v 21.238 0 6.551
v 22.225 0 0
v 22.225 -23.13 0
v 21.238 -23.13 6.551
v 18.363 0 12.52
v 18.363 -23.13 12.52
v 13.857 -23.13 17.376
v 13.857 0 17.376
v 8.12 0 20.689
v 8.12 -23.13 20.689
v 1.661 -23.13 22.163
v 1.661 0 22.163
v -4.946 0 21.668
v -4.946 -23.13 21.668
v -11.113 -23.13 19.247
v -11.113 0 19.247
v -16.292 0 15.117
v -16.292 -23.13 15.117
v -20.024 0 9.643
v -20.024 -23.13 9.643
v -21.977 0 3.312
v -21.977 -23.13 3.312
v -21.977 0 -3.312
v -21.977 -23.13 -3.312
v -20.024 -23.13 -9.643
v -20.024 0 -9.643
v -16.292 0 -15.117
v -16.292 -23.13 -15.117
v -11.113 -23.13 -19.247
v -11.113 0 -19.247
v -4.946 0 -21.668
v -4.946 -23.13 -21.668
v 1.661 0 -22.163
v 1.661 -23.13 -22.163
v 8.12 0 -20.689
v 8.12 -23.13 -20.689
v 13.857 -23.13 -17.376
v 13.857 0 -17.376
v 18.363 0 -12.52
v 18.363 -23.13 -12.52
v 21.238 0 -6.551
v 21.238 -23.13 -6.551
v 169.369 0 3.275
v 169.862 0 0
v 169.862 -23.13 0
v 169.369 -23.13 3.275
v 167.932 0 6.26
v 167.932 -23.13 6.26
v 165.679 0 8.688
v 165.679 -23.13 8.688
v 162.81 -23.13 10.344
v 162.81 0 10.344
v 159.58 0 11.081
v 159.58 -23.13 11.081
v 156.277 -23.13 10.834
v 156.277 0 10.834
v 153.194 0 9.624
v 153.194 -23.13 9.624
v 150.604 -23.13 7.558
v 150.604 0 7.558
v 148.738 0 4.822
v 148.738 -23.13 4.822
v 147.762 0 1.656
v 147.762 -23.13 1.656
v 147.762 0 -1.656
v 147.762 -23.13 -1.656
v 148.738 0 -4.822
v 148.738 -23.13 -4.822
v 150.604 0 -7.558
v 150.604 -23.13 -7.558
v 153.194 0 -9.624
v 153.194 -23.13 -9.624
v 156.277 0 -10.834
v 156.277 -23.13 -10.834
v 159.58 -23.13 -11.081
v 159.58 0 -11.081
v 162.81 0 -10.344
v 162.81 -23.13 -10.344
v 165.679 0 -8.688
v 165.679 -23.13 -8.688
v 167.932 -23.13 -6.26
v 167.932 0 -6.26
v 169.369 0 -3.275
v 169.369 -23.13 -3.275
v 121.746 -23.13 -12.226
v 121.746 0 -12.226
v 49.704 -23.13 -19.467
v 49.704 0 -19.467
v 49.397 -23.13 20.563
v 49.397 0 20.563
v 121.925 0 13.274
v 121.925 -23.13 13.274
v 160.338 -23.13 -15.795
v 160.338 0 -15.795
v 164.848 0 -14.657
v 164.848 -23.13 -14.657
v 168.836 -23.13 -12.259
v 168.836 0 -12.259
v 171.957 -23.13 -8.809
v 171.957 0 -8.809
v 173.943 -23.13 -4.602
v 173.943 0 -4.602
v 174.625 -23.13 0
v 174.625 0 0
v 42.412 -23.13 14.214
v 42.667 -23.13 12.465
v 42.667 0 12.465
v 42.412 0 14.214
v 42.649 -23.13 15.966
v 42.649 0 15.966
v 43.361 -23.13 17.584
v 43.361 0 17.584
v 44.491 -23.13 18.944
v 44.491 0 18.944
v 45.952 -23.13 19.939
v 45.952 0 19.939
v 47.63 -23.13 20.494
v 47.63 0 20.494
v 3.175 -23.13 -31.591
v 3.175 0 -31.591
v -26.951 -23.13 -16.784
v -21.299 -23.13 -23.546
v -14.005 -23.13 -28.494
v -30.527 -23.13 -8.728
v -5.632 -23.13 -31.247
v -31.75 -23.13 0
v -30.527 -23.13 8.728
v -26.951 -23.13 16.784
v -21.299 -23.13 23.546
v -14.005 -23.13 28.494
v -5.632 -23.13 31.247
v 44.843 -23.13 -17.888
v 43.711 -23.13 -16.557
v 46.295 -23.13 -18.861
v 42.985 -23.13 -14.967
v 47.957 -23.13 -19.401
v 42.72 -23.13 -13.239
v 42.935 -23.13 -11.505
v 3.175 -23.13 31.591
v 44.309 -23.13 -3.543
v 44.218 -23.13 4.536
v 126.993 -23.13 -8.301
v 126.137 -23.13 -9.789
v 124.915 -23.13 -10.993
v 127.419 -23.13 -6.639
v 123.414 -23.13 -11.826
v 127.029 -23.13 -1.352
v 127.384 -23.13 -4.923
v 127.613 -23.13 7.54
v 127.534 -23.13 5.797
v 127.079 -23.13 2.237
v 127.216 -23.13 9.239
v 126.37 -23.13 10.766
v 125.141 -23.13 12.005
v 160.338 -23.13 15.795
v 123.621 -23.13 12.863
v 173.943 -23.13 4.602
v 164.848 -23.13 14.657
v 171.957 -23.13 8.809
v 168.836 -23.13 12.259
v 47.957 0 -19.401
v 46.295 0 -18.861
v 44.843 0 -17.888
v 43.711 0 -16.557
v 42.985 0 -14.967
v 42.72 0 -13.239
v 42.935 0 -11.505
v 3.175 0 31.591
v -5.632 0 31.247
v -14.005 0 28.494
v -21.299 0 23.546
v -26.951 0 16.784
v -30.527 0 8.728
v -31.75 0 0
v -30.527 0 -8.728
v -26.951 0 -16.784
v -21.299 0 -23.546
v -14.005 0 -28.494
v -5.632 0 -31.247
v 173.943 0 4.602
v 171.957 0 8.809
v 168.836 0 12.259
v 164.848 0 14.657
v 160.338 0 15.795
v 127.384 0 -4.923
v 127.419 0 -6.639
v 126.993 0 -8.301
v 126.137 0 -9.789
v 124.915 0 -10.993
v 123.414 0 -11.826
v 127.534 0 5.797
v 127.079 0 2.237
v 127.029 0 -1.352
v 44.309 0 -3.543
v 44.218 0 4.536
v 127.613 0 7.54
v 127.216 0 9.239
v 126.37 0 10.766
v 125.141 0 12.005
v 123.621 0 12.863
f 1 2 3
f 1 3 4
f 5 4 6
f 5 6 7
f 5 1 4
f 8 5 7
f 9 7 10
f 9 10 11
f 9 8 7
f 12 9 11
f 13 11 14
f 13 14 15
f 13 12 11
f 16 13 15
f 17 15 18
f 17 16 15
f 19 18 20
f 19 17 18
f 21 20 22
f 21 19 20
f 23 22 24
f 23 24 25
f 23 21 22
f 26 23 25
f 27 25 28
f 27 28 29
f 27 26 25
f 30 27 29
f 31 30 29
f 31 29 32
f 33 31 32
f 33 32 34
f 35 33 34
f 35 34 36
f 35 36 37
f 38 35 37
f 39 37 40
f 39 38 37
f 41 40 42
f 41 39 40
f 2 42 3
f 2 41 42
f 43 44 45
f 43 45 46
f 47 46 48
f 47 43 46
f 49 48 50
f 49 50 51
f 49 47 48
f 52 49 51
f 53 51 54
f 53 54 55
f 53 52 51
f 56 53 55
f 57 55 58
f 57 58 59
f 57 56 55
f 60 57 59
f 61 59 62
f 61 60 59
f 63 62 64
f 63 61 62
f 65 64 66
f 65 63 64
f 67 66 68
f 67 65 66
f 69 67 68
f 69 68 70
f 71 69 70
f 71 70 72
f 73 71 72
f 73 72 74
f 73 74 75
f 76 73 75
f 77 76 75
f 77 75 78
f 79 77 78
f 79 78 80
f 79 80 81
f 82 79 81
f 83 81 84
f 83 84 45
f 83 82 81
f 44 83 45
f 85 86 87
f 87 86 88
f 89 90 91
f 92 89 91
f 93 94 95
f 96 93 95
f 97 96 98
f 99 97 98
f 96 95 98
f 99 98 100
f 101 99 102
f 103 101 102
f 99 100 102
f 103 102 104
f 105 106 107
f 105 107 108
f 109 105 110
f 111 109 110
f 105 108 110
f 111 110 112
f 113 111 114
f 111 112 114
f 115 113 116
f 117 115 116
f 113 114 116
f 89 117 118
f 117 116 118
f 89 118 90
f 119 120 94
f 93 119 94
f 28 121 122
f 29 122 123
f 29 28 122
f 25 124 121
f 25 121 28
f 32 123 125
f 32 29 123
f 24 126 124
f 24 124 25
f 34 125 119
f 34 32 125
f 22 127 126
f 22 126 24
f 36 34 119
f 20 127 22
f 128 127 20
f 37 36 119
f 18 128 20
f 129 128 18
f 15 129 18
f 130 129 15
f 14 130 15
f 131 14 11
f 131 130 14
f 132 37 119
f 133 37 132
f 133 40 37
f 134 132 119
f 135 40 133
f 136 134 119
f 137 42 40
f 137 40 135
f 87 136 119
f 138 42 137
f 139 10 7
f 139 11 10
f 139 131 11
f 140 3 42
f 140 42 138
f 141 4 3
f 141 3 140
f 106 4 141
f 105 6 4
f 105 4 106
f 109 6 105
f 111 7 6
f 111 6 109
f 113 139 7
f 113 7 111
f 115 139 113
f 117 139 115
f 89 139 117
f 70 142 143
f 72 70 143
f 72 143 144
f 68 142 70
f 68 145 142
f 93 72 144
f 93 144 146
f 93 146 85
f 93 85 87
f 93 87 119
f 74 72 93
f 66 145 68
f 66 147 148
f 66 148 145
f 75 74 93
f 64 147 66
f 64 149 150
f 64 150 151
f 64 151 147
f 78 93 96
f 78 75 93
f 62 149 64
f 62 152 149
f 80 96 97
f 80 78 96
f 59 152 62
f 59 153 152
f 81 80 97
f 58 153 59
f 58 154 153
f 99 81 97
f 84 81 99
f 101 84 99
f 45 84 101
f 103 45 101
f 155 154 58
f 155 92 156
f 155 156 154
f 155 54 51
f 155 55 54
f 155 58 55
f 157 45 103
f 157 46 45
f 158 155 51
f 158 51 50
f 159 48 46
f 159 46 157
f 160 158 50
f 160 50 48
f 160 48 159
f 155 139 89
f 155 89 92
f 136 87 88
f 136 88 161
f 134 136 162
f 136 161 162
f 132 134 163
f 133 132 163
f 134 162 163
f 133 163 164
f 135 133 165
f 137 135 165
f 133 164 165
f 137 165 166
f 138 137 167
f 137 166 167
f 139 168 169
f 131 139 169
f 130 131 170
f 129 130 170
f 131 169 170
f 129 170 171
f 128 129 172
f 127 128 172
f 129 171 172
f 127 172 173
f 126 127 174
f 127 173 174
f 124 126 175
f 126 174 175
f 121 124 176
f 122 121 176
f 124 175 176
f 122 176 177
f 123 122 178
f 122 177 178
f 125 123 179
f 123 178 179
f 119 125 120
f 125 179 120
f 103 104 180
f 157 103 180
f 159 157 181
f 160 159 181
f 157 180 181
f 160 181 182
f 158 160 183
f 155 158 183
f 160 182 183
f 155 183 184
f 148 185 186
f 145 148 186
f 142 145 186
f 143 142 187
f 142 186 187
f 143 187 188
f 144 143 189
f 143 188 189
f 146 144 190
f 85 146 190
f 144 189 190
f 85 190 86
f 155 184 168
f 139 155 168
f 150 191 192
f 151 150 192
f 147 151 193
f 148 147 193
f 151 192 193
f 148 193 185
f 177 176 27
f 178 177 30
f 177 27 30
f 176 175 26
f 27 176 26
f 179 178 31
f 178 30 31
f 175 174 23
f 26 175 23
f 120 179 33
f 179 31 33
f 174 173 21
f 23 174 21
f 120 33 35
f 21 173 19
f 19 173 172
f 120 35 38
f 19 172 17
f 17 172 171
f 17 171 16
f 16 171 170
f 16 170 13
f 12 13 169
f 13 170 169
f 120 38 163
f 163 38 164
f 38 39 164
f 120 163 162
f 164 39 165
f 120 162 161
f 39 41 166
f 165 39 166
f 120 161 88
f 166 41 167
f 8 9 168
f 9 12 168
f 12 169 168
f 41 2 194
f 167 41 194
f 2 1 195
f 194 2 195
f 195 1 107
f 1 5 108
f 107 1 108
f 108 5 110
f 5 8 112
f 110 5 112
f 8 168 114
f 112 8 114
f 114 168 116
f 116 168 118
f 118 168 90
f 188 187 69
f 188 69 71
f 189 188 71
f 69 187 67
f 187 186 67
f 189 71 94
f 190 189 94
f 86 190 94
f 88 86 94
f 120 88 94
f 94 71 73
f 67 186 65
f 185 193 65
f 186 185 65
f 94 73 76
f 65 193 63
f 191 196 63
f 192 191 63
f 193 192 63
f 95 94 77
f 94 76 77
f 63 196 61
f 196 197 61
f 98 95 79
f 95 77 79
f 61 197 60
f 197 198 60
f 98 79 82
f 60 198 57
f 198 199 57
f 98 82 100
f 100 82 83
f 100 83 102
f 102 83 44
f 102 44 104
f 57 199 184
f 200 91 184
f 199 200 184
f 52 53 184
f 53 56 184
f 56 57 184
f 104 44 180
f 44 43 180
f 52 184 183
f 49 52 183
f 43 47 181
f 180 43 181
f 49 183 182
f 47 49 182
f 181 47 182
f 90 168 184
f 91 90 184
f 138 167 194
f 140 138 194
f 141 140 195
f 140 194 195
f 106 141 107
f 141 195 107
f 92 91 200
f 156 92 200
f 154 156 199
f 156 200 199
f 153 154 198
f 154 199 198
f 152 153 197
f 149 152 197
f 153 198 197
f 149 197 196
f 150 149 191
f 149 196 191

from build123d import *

# Parameters (mm, degrees)
F0_R     = 22.225
F0_R_2   = 11.1125
F1_DEPTH = 23.1302697212


# Not quite as in the source:
# - a feature of the source that left no trace in its solid (it failed there, or was rolled back) is left out


with BuildPart() as f1:
    # F0 (on Front) → F1 (new body)
    with BuildSketch(Plane.XZ):
        with BuildLine():
            ThreePointArc((3.175, 31.5908511281), (23.5464301965, 21.2985474857), (31.75, 0))
            ThreePointArc((31.75, 0), (23.5464301965, -21.2985474857), (3.175, -31.5908511281))
            Line((3.175, -31.5908511281), (160.3375, -15.7954255641))
            ThreePointArc((160.3375, -15.7954255641), (142.875, 0), (160.3375, 15.7954255641))
            Line((160.3375, 15.7954255641), (3.175, 31.5908511281))
        make_face()
        with BuildLine():
            ThreePointArc((42.9352789855, -11.5049692931), (44.4472073469, 0.4982560178), (42.6665789099, 12.4645715579))
            ThreePointArc((42.6665789099, 12.4645715579), (43.8780302599, 18.3037033525), (49.3968044685, 20.5633948632))
            Line((49.3968044685, 20.5633948632), (121.9253365113, 13.2740031244))
            ThreePointArc((121.9253365113, 13.2740031244), (126.3702809224, 10.7659070162), (127.5336137594, 5.7965274156))
            ThreePointArc((127.5336137594, 5.7965274156), (127.0030897981, 0.4429363765), (127.3840485491, -4.9233717695))
            ThreePointArc((127.3840485491, -4.9233717695), (126.1371549085, -9.7886185026), (121.7458582589, -12.226216349))
            Line((121.7458582589, -12.226216349), (49.7038902692, -19.4667065606))
            ThreePointArc((49.7038902692, -19.4667065606), (44.2309158386, -17.261504048), (42.9352789855, -11.5049692931))
        make_face(mode=Mode.SUBTRACT)
        with BuildLine():
            ThreePointArc((3.175, -31.5908511281), (23.5464301965, -21.2985474857), (31.75, 0))
            ThreePointArc((31.75, 0), (23.5464301965, 21.2985474857), (3.175, 31.5908511281))
            ThreePointArc((3.175, 31.5908511281), (-31.75, 0), (3.175, -31.5908511281))
        make_face()
        Circle(F0_R, mode=Mode.SUBTRACT)
        with BuildLine():
            ThreePointArc((174.625, 0), (170.5232150983, 10.6492737428), (160.3375, 15.7954255641))
            ThreePointArc((160.3375, 15.7954255641), (142.875, 0), (160.3375, -15.7954255641))
            ThreePointArc((160.3375, -15.7954255641), (170.5232150983, -10.6492737428), (174.625, 0))
        make_face()
        with Locations((158.75, 0)):
            Circle(F0_R_2, mode=Mode.SUBTRACT)
    extrude(amount=F1_DEPTH)


solid = f1.part
